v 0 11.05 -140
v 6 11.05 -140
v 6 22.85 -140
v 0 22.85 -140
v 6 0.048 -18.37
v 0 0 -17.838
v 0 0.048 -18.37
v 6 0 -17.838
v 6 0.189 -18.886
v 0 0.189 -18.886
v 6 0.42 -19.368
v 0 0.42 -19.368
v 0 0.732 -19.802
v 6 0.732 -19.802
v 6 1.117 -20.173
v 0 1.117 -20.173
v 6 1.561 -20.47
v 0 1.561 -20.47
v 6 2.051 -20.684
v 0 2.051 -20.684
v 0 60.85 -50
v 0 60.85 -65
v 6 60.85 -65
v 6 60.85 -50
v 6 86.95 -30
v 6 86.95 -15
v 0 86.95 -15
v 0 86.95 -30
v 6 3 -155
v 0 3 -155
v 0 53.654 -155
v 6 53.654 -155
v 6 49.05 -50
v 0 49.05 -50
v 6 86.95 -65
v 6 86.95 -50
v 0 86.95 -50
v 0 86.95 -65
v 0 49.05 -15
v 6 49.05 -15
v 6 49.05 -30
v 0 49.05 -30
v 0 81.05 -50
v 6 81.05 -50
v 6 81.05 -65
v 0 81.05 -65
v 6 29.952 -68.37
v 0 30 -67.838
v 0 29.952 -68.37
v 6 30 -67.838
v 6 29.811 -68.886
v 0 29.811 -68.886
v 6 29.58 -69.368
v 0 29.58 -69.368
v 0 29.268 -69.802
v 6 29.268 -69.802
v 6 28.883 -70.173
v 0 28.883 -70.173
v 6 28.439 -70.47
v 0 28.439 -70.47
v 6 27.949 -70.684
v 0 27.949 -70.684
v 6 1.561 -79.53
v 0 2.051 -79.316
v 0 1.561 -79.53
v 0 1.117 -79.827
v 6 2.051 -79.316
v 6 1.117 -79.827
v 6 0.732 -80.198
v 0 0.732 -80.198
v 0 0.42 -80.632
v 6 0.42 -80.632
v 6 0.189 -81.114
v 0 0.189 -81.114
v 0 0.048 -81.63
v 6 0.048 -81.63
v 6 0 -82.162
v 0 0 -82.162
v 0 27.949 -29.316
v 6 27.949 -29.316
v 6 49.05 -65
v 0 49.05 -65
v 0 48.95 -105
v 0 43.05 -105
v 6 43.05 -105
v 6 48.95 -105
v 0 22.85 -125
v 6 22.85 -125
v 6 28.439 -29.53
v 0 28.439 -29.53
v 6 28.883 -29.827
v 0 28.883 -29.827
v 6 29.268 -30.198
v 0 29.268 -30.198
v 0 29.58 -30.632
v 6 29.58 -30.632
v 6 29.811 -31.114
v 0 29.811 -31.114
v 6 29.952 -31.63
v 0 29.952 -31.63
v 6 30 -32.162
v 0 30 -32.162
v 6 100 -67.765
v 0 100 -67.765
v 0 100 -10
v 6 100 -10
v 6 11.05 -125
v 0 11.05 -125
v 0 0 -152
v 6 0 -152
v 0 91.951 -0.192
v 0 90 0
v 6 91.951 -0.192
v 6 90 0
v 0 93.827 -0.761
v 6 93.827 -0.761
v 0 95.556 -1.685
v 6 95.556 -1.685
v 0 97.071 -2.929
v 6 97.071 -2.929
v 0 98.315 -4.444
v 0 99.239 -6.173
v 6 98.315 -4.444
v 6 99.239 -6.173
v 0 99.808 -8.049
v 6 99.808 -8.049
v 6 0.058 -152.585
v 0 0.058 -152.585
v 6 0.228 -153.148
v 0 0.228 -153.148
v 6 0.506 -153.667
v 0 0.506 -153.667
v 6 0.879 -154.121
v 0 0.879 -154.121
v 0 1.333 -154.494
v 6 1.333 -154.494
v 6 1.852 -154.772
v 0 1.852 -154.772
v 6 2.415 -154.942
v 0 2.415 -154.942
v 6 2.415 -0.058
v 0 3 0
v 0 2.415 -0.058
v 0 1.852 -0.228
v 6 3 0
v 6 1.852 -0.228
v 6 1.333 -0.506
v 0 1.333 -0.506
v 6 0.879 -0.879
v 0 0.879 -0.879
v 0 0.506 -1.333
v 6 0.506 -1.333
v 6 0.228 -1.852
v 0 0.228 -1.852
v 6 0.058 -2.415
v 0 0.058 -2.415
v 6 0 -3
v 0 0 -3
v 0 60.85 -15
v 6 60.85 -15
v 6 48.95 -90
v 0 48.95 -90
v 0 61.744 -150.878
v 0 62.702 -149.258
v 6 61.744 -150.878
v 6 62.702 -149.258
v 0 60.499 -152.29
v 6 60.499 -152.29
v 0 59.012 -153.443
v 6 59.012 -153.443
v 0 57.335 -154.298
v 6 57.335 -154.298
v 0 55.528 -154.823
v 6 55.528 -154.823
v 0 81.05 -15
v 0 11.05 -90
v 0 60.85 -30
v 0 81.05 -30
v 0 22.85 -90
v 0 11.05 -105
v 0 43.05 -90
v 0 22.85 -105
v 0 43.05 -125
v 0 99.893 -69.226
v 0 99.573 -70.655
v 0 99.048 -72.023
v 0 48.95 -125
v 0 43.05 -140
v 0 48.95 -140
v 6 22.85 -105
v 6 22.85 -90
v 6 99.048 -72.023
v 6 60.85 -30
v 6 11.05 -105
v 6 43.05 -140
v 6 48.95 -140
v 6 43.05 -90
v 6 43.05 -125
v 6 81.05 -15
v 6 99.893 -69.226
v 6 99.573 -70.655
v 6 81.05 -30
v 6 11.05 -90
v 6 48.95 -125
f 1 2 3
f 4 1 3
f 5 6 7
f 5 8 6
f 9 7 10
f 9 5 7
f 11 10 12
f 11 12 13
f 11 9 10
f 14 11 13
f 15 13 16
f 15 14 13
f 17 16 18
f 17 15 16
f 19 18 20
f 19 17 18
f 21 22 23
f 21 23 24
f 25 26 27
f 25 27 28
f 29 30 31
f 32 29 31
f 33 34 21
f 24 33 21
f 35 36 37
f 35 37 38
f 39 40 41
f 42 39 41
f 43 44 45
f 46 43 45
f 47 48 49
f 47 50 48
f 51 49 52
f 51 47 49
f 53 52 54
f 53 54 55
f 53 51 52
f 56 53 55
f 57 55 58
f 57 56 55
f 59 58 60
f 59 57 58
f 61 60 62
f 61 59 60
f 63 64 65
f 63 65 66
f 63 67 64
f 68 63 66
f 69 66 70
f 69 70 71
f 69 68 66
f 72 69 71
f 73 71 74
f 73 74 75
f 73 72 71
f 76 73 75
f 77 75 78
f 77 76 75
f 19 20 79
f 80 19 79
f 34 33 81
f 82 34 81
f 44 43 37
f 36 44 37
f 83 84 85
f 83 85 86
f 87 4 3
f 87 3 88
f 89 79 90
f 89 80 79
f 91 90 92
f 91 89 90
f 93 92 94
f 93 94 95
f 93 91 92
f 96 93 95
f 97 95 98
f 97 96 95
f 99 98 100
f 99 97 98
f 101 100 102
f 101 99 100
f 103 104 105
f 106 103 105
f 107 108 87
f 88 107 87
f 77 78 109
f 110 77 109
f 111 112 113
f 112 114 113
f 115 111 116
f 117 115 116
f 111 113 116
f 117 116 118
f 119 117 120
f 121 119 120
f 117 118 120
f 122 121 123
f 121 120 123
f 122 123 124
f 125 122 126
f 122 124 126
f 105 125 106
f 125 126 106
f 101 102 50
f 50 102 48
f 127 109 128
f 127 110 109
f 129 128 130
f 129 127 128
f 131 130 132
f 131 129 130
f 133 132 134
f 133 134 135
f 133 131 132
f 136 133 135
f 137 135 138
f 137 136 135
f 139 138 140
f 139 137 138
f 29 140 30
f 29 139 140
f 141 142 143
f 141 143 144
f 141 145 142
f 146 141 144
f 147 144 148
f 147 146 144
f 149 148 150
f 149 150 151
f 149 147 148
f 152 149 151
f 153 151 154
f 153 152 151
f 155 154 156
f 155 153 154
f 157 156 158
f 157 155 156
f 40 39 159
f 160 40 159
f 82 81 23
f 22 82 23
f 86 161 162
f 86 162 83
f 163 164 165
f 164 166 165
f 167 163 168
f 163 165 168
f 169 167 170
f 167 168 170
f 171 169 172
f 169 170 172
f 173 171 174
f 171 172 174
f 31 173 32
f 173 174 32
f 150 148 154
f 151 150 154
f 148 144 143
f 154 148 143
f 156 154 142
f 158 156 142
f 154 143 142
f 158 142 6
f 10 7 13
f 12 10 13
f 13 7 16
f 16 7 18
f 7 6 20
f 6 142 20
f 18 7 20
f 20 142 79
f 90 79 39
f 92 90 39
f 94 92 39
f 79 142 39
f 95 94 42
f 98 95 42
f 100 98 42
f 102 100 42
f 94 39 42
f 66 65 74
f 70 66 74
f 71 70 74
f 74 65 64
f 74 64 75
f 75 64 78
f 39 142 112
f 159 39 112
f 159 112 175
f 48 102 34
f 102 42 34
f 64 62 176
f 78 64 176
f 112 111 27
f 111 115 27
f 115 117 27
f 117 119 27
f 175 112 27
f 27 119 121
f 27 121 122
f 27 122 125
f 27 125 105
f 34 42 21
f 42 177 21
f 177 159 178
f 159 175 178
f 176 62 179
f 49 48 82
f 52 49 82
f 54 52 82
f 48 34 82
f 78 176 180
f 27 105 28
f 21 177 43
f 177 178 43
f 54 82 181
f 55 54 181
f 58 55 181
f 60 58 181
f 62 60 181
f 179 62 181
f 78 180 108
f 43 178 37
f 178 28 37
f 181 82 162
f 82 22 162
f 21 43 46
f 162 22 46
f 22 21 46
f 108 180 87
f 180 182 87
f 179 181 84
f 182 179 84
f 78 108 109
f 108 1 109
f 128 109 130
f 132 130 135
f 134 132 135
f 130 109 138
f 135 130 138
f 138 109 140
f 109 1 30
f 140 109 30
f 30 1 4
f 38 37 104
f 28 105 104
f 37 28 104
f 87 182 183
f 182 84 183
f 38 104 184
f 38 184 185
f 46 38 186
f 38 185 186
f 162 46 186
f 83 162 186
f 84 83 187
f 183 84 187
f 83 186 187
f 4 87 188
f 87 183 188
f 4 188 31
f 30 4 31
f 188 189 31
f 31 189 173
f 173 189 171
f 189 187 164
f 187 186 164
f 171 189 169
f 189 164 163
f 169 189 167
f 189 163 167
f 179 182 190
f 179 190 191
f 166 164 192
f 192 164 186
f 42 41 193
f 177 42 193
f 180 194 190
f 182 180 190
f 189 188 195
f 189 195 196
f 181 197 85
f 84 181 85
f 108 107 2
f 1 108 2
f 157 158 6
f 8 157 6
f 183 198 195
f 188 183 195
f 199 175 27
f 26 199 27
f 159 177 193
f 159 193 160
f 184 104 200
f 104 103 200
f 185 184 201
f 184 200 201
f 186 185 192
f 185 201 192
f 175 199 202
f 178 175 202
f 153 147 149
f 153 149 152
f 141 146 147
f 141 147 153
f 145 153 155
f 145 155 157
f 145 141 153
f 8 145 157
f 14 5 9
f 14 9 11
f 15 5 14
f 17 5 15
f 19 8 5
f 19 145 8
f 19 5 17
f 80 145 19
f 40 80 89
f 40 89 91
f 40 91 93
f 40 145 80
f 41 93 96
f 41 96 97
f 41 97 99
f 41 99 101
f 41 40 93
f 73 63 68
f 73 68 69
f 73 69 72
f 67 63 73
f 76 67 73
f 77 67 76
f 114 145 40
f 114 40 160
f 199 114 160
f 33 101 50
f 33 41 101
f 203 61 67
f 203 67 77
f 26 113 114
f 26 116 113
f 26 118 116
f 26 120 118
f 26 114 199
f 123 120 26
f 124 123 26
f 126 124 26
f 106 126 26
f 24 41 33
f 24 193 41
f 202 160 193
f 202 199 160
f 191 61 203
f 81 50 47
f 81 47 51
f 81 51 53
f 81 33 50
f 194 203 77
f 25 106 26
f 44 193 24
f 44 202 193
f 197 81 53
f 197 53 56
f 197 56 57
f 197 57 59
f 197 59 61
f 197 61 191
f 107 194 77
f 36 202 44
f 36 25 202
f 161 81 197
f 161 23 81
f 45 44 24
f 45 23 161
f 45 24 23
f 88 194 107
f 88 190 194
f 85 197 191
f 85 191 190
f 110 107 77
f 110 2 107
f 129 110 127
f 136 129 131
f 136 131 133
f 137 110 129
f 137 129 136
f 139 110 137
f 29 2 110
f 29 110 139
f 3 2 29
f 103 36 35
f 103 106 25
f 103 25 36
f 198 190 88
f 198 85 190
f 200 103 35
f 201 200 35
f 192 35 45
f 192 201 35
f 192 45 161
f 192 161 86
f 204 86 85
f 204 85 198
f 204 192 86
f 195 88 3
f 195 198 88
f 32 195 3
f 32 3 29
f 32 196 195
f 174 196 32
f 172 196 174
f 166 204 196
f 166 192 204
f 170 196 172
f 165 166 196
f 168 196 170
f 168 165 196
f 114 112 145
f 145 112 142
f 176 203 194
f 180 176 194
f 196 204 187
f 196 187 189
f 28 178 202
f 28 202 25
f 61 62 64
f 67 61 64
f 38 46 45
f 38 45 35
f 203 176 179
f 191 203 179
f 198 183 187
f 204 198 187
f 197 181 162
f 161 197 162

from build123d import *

# Parameters (mm, degrees)
GRUNDFORM_DEPTH          = 6
SKIZZE2_W                = 15
SKIZZE2_H                = 5.9
ZAPFENDURCHBRUCH_DEPTH   = 185.556224495
VERRUNDUNG1_R            = 10
VERRUNDUNG2_R            = 3
SKIZZE3_W                = 15
SKIZZE3_H                = 5.9
ZAPFENDURCHBRUCH_2_DEPTH = 185.556224495


with BuildPart() as part:
    # Skizze1 → Grundform (new body)
    with BuildSketch(Plane(origin=(0, 0, 0), x_dir=(0, 0, -1), z_dir=(1, 0, 0))):
        Polygon((0, 0), (20, 0), (30, 30), (70, 30), (80, 0), (155, 0), (155, 60), (70, 100), (0, 100), align=None)
    extrude(amount=GRUNDFORM_DEPTH)

    # Skizze2 → Zapfendurchbruch (cut, through all)
    with BuildSketch(Plane(origin=(6, 0, 0), x_dir=(0, 0, -1), z_dir=(1, 0, 0))):
        with Locations((97.5, 46)):
            Rectangle(SKIZZE2_W, SKIZZE2_H)
        with Locations((132.5, 46)):
            Rectangle(SKIZZE2_W, SKIZZE2_H)
        with Locations((132.5, 14)):
            Rectangle(SKIZZE2_W, SKIZZE2_H)
        with Locations((97.5, 14)):
            Rectangle(SKIZZE2_W, SKIZZE2_H)
        with Locations((57.5, 84)):
            Rectangle(SKIZZE2_W, SKIZZE2_H)
        with Locations((22.5, 84)):
            Rectangle(SKIZZE2_W, SKIZZE2_H)
        with Locations((22.5, 52)):
            Rectangle(SKIZZE2_W, SKIZZE2_H)
        with Locations((57.5, 52)):
            Rectangle(SKIZZE2_W, SKIZZE2_H)
    extrude(amount=-ZAPFENDURCHBRUCH_DEPTH, mode=Mode.SUBTRACT)

    # Verrundung1
    verrundung1_edges = [part.edges().sort_by_distance(p)[0] for p in [
        (3, 100, 0),
        (3, 100, -70),
        (3, 60, -155),
    ]]
    fillet(verrundung1_edges, radius=VERRUNDUNG1_R)

    # Verrundung2
    verrundung2_edges = [part.edges().sort_by_distance(p)[0] for p in [
        (3, 0, -155),
        (3, 0, -80),
        (3, 30, -70),
        (3, 30, -30),
        (3, 0, -20),
        (3, 0, 0),
    ]]
    fillet(verrundung2_edges, radius=VERRUNDUNG2_R)

    # Skizze3 → Zapfendurchbruch 2 (cut, through all)
    with BuildSketch(Plane.ZY):
        with Locations((-132.5, 19.9)):
            Rectangle(SKIZZE3_W, SKIZZE3_H)
        with Locations((-97.5, 19.9)):
            Rectangle(SKIZZE3_W, SKIZZE3_H)
        with Locations((-57.5, 57.9)):
            Rectangle(SKIZZE3_W, SKIZZE3_H)
        with Locations((-22.5, 57.9)):
            Rectangle(SKIZZE3_W, SKIZZE3_H)
    extrude(amount=-ZAPFENDURCHBRUCH_2_DEPTH, mode=Mode.SUBTRACT)


solid = part.part
